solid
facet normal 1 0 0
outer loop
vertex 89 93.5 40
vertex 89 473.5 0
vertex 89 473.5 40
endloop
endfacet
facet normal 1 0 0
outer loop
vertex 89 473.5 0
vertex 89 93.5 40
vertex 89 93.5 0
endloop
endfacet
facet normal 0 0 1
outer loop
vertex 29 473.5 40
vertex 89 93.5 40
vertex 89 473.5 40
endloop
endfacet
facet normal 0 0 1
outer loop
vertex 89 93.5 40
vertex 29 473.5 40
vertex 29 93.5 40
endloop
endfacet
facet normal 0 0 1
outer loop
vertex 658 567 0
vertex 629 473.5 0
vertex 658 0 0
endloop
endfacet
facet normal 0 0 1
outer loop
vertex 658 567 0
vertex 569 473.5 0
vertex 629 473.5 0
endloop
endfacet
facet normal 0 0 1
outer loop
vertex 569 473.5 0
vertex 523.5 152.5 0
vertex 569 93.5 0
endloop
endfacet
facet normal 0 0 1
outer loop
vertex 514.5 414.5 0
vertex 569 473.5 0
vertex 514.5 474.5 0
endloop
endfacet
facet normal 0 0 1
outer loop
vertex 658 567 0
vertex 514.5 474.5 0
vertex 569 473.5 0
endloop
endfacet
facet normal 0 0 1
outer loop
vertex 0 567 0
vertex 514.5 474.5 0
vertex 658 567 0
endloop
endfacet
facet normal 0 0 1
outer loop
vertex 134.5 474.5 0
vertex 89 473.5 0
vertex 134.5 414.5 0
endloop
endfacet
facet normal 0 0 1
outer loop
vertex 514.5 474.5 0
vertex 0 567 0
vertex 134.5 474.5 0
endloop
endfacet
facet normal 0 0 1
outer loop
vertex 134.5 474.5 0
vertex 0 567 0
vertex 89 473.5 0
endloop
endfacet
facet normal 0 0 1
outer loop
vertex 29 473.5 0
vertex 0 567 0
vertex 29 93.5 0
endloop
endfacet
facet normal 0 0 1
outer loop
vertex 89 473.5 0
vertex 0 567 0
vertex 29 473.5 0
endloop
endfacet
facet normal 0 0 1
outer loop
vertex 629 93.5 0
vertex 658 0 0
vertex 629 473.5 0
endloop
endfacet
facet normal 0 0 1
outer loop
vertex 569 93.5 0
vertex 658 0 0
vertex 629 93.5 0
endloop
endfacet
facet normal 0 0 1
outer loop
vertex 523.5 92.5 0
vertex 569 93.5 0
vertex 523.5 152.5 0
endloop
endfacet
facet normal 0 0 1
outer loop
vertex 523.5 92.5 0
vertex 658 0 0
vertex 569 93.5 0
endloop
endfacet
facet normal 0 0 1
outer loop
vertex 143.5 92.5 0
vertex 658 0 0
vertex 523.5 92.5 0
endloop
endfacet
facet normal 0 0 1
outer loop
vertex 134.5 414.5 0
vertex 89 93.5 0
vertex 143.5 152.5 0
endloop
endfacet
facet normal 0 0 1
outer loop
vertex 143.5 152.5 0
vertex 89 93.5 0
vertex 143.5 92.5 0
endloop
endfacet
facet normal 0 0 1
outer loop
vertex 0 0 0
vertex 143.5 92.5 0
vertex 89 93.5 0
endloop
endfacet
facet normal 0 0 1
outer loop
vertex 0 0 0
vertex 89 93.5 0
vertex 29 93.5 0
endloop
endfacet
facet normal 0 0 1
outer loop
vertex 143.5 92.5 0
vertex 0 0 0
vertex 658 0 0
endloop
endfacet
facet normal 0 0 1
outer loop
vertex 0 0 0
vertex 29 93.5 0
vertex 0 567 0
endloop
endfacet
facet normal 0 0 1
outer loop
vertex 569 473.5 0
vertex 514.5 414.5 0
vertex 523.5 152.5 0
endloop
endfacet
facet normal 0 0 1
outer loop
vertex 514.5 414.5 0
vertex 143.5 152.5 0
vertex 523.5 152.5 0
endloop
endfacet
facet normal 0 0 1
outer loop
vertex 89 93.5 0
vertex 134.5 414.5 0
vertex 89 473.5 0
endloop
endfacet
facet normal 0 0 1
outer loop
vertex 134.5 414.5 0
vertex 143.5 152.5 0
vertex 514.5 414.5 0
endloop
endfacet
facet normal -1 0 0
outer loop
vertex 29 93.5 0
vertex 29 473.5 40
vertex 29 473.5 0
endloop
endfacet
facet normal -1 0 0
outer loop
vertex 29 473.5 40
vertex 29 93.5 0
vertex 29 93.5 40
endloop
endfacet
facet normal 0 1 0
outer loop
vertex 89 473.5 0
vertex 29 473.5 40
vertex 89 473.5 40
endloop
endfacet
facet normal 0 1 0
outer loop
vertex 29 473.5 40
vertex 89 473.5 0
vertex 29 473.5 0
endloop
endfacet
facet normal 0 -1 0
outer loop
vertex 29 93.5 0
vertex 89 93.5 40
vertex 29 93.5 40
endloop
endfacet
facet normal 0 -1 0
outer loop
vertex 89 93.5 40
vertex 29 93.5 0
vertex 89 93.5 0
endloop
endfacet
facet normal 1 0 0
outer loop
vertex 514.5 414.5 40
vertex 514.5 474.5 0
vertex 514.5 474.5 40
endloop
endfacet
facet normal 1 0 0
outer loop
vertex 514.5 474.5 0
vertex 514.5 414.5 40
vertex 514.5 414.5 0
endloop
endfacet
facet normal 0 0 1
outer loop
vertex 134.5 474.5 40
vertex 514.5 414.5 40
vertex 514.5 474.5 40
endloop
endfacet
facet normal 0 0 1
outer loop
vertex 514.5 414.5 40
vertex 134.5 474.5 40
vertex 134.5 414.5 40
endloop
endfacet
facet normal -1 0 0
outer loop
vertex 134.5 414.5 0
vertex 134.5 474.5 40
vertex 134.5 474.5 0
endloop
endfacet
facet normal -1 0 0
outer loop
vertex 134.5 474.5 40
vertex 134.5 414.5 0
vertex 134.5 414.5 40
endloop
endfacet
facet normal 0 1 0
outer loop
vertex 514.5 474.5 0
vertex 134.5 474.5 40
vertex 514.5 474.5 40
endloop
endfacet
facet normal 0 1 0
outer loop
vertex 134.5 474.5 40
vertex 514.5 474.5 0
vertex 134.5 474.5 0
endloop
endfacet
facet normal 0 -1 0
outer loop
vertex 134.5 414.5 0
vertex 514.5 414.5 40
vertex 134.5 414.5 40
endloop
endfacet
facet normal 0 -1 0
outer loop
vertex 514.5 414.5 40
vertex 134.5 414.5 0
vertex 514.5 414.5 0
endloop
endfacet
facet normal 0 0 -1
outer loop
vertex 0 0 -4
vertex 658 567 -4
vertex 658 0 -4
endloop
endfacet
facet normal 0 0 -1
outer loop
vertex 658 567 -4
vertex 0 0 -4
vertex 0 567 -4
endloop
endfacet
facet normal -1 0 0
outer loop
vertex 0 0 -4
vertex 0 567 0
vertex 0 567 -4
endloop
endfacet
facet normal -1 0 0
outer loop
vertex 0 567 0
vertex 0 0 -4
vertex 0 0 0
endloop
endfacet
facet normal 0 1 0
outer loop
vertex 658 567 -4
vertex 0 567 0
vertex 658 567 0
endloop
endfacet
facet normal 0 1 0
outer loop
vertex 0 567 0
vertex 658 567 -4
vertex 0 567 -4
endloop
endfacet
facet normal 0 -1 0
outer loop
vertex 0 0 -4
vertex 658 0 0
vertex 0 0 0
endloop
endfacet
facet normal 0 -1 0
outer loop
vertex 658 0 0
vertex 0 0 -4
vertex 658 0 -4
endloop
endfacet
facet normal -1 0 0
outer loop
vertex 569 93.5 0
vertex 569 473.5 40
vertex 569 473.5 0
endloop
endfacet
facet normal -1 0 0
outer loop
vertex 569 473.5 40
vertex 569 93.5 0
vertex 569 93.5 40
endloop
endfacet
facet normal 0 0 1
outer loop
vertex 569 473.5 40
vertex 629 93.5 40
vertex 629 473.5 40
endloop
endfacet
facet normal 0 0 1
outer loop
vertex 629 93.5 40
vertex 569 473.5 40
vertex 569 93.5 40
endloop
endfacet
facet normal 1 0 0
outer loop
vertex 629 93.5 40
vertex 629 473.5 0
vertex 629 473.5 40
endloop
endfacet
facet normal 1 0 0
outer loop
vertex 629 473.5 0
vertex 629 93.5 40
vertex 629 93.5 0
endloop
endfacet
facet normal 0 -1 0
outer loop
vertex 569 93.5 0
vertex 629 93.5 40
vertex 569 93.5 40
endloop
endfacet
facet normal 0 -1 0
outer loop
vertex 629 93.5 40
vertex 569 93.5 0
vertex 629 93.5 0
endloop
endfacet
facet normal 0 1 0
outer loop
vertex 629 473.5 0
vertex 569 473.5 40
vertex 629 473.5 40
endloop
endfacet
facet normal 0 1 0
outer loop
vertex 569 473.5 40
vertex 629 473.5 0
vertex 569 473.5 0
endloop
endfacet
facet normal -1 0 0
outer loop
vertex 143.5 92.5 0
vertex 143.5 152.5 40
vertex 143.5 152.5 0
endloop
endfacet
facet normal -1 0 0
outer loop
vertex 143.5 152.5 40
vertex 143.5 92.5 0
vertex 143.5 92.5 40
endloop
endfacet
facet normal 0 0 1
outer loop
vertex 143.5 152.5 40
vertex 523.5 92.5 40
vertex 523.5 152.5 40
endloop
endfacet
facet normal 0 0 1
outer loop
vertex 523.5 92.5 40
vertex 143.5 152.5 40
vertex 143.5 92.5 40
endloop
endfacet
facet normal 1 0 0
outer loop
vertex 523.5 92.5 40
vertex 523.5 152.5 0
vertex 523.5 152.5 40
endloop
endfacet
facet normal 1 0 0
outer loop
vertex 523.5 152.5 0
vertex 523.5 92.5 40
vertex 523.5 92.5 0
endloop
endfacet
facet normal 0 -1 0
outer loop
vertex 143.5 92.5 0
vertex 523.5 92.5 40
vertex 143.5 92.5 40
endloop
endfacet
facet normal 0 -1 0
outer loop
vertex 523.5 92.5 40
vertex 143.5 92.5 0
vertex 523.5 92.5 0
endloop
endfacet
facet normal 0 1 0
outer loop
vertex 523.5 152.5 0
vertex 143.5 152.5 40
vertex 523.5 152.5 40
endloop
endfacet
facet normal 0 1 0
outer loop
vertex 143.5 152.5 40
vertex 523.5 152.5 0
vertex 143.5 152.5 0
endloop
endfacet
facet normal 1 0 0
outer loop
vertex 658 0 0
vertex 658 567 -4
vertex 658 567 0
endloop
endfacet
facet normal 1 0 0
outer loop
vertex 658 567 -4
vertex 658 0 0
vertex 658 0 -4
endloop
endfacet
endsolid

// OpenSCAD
// Schweißtisch geschlossen

vkr_h=40;
vkr_l=380;
vkr_b=60;

p_h=4;
p_l=567;
p_b=329;

clear=1;
dist=0;

module mod() {
    // 1. bar
    color( "Olive", 1.0 ) {
        translate([0.5*vkr_b-clear,(p_l-vkr_l)/2]) {
            cube([vkr_b,vkr_l,vkr_h], 0);
        };
    };


/*
    // 2. bar
    translate([p_b-1.5*vkr_b-.5*clear,(p_l-vkr_l)/2-vkr_b-clear,0]) {
        color( "Lime", 1.0 ) {
            cube([vkr_b,vkr_l/2,vkr_h], 0);
        };
    };
    
    // 2. bar
    translate([p_b-1.5*vkr_b-.5*clear,(p_l/2)+vkr_b+clear,0]) {
        color( "Lime", 1.0 ) {
            cube([vkr_b,vkr_l/2,vkr_h], 0);
        };
    };
*/
  
    // 4. bar
    translate([p_b/2-vkr_b/2,p_l/2+vkr_l/2+clear-vkr_b,0]) {
        color( "ForestGreen", 1.0 ) {
            cube([vkr_l,vkr_b,vkr_h], 0);
        };
    };
    
/*
    // 3. bar
    translate([((p_b-(vkr_l/2))/2),p_l/2+vkr_l/2+clear,0]) {
        color( "Red", 1.0 ) {
            cube([vkr_l/2,vkr_b,vkr_h], 0);
        };
    };

    // 5. bar
    translate([((p_b-(vkr_l/2))/2),(p_l-vkr_l)/2-vkr_b-clear,0]) {
        color( "Red", 1.0 ) {
            cube([vkr_l/2,vkr_b,vkr_h], 0);
        };
    };
*/
 
    // Plate
    translate([0,0,-p_h]) {
        cube([p_b,p_l,p_h], 0);
    };
};


mod();

translate([p_b*2+dist,p_l,0]) {
    rotate(a=180, v=[0,0,1]){
        mod();
    };
};
